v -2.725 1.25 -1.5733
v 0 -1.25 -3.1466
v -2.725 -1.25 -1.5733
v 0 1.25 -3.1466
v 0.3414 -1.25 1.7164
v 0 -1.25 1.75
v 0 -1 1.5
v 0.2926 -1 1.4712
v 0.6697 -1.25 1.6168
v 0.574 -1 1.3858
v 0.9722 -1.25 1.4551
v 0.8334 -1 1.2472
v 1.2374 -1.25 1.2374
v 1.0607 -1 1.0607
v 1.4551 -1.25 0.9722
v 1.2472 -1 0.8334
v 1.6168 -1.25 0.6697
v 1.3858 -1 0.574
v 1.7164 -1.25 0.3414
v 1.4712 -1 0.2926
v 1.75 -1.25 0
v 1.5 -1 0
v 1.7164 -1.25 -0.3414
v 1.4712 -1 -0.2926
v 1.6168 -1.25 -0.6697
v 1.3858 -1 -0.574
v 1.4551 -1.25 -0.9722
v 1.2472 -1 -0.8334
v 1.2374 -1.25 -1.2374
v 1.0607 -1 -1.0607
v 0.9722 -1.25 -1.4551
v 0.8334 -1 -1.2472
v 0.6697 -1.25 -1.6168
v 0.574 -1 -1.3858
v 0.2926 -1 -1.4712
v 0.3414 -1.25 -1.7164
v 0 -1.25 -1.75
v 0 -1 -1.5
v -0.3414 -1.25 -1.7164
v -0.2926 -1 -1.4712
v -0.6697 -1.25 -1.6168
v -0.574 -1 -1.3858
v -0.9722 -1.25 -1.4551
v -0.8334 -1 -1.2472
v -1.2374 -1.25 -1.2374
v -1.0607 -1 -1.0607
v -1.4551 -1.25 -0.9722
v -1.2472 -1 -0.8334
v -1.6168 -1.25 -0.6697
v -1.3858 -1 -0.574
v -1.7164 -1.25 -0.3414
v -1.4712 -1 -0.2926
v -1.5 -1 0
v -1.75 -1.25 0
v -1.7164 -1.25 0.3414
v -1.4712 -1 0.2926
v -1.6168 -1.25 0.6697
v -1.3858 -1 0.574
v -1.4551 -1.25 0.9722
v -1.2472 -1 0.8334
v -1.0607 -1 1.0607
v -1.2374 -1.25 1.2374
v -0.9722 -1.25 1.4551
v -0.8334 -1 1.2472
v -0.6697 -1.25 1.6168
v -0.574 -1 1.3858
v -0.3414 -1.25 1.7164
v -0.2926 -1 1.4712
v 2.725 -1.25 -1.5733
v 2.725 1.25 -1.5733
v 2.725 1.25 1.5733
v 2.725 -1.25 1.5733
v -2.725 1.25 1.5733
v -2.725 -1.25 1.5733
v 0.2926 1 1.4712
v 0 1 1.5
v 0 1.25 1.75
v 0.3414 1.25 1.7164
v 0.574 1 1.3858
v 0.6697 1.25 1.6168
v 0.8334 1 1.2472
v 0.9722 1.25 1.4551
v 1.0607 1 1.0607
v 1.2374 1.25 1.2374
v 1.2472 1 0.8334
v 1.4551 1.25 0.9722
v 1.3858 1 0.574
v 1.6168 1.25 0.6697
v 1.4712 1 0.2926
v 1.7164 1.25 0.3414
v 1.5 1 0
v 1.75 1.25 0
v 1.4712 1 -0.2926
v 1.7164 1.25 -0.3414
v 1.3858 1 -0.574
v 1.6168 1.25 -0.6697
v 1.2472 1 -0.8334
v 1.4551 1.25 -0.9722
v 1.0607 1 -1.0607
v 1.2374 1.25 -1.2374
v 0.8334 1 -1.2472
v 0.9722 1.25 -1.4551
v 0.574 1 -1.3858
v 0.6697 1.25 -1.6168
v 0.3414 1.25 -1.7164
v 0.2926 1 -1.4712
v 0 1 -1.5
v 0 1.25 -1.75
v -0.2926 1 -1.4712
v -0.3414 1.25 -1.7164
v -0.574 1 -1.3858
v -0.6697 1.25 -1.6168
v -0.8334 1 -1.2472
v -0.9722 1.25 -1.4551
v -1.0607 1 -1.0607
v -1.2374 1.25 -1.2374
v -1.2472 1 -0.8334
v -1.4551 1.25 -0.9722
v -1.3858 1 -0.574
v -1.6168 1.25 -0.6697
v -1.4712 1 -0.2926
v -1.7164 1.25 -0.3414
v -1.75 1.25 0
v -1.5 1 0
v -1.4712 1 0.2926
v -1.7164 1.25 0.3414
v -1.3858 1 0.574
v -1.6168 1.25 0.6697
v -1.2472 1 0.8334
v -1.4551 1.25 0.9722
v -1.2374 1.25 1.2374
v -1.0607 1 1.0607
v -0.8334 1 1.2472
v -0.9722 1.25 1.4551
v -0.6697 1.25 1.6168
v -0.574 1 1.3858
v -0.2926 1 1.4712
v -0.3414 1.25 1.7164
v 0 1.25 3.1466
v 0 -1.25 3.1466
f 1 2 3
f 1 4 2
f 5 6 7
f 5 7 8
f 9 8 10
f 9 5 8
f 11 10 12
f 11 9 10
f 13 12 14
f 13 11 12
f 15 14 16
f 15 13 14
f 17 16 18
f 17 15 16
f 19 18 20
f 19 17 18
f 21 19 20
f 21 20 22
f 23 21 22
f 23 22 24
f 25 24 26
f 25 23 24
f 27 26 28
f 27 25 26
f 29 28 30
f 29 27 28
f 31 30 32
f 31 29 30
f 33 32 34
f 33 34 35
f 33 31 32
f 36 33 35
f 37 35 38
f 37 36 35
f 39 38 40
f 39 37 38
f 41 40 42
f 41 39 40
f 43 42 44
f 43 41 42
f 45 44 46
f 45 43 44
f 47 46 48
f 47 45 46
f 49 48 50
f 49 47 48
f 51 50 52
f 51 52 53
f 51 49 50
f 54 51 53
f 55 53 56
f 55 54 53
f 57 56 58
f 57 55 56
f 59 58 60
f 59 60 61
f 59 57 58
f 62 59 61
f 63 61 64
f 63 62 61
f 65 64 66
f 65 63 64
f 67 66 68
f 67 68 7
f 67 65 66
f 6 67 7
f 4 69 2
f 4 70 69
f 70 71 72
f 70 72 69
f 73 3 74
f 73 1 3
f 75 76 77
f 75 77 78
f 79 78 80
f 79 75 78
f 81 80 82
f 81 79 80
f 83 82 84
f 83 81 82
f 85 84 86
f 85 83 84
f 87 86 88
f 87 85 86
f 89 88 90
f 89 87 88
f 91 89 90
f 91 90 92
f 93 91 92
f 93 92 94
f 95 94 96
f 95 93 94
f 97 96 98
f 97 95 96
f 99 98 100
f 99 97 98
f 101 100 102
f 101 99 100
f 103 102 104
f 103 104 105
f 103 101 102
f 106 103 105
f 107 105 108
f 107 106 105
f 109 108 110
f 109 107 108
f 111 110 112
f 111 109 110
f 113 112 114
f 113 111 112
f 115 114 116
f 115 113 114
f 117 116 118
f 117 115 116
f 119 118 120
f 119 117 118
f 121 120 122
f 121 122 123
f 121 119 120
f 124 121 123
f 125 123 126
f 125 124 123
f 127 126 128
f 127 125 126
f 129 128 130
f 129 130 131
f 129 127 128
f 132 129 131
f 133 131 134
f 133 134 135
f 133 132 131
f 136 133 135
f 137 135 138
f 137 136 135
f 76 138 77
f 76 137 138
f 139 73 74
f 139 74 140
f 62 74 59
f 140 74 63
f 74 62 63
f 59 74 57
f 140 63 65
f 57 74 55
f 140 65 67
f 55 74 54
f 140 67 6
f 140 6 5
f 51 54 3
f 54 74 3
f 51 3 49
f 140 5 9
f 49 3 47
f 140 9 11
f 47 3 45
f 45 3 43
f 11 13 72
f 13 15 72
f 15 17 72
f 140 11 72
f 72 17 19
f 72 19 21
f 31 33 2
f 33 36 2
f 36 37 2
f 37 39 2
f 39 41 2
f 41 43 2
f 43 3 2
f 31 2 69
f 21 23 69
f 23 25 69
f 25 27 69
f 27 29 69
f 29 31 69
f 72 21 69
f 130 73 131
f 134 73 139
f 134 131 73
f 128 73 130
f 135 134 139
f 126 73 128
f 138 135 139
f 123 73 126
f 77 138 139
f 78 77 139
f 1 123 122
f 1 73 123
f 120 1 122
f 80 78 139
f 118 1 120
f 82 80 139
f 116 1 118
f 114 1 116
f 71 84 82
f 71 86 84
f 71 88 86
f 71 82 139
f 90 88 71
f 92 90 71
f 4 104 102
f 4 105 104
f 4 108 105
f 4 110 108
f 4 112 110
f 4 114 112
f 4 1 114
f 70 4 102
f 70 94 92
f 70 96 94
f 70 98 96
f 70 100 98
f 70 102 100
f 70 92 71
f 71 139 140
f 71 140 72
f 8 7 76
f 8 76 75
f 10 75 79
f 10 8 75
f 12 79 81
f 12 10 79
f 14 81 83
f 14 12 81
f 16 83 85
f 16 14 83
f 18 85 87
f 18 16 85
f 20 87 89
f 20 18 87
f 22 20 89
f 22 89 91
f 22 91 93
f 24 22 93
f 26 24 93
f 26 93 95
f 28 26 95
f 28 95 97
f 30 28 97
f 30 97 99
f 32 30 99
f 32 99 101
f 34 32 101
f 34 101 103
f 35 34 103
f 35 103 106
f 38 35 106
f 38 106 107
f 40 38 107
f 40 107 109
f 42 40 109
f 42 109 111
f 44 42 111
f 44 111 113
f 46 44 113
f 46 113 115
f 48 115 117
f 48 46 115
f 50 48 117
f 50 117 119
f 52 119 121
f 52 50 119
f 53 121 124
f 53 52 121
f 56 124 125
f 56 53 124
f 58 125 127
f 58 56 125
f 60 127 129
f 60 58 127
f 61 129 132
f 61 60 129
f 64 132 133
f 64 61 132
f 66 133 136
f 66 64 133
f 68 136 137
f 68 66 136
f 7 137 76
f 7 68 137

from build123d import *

# Parameters (mm, degrees)
SKETCH2_R           = 1.5
BOSS_EXTRUDE1_DEPTH = 1.25
CHAMFER1_SIZE       = 0.25


with BuildPart() as part:
    # Sketch2 → Boss-Extrude1 (new, symmetric)
    with BuildSketch(Plane(origin=(0, 0, 0), x_dir=(1, 0, 0), z_dir=(0, 1, 0))):
        Polygon((-2.725, 1.573279484), (-2.725, -1.573279484), (0, -3.146558967), (2.725, -1.573279484), (2.725, 1.573279484), (0, 3.146558967), align=None)
        with Locations(Location((0, 0, 0), (0, 0, 270))):
            Circle(SKETCH2_R, mode=Mode.SUBTRACT)
    extrude(amount=BOSS_EXTRUDE1_DEPTH, both=True)

    # Chamfer1
    chamfer1_edges = [part.edges().sort_by_distance(p)[0] for p in [
        (0, -1.25, -1.5),
        (0, 1.25, -1.5),
    ]]
    chamfer(chamfer1_edges, length=CHAMFER1_SIZE)


solid = part.part
